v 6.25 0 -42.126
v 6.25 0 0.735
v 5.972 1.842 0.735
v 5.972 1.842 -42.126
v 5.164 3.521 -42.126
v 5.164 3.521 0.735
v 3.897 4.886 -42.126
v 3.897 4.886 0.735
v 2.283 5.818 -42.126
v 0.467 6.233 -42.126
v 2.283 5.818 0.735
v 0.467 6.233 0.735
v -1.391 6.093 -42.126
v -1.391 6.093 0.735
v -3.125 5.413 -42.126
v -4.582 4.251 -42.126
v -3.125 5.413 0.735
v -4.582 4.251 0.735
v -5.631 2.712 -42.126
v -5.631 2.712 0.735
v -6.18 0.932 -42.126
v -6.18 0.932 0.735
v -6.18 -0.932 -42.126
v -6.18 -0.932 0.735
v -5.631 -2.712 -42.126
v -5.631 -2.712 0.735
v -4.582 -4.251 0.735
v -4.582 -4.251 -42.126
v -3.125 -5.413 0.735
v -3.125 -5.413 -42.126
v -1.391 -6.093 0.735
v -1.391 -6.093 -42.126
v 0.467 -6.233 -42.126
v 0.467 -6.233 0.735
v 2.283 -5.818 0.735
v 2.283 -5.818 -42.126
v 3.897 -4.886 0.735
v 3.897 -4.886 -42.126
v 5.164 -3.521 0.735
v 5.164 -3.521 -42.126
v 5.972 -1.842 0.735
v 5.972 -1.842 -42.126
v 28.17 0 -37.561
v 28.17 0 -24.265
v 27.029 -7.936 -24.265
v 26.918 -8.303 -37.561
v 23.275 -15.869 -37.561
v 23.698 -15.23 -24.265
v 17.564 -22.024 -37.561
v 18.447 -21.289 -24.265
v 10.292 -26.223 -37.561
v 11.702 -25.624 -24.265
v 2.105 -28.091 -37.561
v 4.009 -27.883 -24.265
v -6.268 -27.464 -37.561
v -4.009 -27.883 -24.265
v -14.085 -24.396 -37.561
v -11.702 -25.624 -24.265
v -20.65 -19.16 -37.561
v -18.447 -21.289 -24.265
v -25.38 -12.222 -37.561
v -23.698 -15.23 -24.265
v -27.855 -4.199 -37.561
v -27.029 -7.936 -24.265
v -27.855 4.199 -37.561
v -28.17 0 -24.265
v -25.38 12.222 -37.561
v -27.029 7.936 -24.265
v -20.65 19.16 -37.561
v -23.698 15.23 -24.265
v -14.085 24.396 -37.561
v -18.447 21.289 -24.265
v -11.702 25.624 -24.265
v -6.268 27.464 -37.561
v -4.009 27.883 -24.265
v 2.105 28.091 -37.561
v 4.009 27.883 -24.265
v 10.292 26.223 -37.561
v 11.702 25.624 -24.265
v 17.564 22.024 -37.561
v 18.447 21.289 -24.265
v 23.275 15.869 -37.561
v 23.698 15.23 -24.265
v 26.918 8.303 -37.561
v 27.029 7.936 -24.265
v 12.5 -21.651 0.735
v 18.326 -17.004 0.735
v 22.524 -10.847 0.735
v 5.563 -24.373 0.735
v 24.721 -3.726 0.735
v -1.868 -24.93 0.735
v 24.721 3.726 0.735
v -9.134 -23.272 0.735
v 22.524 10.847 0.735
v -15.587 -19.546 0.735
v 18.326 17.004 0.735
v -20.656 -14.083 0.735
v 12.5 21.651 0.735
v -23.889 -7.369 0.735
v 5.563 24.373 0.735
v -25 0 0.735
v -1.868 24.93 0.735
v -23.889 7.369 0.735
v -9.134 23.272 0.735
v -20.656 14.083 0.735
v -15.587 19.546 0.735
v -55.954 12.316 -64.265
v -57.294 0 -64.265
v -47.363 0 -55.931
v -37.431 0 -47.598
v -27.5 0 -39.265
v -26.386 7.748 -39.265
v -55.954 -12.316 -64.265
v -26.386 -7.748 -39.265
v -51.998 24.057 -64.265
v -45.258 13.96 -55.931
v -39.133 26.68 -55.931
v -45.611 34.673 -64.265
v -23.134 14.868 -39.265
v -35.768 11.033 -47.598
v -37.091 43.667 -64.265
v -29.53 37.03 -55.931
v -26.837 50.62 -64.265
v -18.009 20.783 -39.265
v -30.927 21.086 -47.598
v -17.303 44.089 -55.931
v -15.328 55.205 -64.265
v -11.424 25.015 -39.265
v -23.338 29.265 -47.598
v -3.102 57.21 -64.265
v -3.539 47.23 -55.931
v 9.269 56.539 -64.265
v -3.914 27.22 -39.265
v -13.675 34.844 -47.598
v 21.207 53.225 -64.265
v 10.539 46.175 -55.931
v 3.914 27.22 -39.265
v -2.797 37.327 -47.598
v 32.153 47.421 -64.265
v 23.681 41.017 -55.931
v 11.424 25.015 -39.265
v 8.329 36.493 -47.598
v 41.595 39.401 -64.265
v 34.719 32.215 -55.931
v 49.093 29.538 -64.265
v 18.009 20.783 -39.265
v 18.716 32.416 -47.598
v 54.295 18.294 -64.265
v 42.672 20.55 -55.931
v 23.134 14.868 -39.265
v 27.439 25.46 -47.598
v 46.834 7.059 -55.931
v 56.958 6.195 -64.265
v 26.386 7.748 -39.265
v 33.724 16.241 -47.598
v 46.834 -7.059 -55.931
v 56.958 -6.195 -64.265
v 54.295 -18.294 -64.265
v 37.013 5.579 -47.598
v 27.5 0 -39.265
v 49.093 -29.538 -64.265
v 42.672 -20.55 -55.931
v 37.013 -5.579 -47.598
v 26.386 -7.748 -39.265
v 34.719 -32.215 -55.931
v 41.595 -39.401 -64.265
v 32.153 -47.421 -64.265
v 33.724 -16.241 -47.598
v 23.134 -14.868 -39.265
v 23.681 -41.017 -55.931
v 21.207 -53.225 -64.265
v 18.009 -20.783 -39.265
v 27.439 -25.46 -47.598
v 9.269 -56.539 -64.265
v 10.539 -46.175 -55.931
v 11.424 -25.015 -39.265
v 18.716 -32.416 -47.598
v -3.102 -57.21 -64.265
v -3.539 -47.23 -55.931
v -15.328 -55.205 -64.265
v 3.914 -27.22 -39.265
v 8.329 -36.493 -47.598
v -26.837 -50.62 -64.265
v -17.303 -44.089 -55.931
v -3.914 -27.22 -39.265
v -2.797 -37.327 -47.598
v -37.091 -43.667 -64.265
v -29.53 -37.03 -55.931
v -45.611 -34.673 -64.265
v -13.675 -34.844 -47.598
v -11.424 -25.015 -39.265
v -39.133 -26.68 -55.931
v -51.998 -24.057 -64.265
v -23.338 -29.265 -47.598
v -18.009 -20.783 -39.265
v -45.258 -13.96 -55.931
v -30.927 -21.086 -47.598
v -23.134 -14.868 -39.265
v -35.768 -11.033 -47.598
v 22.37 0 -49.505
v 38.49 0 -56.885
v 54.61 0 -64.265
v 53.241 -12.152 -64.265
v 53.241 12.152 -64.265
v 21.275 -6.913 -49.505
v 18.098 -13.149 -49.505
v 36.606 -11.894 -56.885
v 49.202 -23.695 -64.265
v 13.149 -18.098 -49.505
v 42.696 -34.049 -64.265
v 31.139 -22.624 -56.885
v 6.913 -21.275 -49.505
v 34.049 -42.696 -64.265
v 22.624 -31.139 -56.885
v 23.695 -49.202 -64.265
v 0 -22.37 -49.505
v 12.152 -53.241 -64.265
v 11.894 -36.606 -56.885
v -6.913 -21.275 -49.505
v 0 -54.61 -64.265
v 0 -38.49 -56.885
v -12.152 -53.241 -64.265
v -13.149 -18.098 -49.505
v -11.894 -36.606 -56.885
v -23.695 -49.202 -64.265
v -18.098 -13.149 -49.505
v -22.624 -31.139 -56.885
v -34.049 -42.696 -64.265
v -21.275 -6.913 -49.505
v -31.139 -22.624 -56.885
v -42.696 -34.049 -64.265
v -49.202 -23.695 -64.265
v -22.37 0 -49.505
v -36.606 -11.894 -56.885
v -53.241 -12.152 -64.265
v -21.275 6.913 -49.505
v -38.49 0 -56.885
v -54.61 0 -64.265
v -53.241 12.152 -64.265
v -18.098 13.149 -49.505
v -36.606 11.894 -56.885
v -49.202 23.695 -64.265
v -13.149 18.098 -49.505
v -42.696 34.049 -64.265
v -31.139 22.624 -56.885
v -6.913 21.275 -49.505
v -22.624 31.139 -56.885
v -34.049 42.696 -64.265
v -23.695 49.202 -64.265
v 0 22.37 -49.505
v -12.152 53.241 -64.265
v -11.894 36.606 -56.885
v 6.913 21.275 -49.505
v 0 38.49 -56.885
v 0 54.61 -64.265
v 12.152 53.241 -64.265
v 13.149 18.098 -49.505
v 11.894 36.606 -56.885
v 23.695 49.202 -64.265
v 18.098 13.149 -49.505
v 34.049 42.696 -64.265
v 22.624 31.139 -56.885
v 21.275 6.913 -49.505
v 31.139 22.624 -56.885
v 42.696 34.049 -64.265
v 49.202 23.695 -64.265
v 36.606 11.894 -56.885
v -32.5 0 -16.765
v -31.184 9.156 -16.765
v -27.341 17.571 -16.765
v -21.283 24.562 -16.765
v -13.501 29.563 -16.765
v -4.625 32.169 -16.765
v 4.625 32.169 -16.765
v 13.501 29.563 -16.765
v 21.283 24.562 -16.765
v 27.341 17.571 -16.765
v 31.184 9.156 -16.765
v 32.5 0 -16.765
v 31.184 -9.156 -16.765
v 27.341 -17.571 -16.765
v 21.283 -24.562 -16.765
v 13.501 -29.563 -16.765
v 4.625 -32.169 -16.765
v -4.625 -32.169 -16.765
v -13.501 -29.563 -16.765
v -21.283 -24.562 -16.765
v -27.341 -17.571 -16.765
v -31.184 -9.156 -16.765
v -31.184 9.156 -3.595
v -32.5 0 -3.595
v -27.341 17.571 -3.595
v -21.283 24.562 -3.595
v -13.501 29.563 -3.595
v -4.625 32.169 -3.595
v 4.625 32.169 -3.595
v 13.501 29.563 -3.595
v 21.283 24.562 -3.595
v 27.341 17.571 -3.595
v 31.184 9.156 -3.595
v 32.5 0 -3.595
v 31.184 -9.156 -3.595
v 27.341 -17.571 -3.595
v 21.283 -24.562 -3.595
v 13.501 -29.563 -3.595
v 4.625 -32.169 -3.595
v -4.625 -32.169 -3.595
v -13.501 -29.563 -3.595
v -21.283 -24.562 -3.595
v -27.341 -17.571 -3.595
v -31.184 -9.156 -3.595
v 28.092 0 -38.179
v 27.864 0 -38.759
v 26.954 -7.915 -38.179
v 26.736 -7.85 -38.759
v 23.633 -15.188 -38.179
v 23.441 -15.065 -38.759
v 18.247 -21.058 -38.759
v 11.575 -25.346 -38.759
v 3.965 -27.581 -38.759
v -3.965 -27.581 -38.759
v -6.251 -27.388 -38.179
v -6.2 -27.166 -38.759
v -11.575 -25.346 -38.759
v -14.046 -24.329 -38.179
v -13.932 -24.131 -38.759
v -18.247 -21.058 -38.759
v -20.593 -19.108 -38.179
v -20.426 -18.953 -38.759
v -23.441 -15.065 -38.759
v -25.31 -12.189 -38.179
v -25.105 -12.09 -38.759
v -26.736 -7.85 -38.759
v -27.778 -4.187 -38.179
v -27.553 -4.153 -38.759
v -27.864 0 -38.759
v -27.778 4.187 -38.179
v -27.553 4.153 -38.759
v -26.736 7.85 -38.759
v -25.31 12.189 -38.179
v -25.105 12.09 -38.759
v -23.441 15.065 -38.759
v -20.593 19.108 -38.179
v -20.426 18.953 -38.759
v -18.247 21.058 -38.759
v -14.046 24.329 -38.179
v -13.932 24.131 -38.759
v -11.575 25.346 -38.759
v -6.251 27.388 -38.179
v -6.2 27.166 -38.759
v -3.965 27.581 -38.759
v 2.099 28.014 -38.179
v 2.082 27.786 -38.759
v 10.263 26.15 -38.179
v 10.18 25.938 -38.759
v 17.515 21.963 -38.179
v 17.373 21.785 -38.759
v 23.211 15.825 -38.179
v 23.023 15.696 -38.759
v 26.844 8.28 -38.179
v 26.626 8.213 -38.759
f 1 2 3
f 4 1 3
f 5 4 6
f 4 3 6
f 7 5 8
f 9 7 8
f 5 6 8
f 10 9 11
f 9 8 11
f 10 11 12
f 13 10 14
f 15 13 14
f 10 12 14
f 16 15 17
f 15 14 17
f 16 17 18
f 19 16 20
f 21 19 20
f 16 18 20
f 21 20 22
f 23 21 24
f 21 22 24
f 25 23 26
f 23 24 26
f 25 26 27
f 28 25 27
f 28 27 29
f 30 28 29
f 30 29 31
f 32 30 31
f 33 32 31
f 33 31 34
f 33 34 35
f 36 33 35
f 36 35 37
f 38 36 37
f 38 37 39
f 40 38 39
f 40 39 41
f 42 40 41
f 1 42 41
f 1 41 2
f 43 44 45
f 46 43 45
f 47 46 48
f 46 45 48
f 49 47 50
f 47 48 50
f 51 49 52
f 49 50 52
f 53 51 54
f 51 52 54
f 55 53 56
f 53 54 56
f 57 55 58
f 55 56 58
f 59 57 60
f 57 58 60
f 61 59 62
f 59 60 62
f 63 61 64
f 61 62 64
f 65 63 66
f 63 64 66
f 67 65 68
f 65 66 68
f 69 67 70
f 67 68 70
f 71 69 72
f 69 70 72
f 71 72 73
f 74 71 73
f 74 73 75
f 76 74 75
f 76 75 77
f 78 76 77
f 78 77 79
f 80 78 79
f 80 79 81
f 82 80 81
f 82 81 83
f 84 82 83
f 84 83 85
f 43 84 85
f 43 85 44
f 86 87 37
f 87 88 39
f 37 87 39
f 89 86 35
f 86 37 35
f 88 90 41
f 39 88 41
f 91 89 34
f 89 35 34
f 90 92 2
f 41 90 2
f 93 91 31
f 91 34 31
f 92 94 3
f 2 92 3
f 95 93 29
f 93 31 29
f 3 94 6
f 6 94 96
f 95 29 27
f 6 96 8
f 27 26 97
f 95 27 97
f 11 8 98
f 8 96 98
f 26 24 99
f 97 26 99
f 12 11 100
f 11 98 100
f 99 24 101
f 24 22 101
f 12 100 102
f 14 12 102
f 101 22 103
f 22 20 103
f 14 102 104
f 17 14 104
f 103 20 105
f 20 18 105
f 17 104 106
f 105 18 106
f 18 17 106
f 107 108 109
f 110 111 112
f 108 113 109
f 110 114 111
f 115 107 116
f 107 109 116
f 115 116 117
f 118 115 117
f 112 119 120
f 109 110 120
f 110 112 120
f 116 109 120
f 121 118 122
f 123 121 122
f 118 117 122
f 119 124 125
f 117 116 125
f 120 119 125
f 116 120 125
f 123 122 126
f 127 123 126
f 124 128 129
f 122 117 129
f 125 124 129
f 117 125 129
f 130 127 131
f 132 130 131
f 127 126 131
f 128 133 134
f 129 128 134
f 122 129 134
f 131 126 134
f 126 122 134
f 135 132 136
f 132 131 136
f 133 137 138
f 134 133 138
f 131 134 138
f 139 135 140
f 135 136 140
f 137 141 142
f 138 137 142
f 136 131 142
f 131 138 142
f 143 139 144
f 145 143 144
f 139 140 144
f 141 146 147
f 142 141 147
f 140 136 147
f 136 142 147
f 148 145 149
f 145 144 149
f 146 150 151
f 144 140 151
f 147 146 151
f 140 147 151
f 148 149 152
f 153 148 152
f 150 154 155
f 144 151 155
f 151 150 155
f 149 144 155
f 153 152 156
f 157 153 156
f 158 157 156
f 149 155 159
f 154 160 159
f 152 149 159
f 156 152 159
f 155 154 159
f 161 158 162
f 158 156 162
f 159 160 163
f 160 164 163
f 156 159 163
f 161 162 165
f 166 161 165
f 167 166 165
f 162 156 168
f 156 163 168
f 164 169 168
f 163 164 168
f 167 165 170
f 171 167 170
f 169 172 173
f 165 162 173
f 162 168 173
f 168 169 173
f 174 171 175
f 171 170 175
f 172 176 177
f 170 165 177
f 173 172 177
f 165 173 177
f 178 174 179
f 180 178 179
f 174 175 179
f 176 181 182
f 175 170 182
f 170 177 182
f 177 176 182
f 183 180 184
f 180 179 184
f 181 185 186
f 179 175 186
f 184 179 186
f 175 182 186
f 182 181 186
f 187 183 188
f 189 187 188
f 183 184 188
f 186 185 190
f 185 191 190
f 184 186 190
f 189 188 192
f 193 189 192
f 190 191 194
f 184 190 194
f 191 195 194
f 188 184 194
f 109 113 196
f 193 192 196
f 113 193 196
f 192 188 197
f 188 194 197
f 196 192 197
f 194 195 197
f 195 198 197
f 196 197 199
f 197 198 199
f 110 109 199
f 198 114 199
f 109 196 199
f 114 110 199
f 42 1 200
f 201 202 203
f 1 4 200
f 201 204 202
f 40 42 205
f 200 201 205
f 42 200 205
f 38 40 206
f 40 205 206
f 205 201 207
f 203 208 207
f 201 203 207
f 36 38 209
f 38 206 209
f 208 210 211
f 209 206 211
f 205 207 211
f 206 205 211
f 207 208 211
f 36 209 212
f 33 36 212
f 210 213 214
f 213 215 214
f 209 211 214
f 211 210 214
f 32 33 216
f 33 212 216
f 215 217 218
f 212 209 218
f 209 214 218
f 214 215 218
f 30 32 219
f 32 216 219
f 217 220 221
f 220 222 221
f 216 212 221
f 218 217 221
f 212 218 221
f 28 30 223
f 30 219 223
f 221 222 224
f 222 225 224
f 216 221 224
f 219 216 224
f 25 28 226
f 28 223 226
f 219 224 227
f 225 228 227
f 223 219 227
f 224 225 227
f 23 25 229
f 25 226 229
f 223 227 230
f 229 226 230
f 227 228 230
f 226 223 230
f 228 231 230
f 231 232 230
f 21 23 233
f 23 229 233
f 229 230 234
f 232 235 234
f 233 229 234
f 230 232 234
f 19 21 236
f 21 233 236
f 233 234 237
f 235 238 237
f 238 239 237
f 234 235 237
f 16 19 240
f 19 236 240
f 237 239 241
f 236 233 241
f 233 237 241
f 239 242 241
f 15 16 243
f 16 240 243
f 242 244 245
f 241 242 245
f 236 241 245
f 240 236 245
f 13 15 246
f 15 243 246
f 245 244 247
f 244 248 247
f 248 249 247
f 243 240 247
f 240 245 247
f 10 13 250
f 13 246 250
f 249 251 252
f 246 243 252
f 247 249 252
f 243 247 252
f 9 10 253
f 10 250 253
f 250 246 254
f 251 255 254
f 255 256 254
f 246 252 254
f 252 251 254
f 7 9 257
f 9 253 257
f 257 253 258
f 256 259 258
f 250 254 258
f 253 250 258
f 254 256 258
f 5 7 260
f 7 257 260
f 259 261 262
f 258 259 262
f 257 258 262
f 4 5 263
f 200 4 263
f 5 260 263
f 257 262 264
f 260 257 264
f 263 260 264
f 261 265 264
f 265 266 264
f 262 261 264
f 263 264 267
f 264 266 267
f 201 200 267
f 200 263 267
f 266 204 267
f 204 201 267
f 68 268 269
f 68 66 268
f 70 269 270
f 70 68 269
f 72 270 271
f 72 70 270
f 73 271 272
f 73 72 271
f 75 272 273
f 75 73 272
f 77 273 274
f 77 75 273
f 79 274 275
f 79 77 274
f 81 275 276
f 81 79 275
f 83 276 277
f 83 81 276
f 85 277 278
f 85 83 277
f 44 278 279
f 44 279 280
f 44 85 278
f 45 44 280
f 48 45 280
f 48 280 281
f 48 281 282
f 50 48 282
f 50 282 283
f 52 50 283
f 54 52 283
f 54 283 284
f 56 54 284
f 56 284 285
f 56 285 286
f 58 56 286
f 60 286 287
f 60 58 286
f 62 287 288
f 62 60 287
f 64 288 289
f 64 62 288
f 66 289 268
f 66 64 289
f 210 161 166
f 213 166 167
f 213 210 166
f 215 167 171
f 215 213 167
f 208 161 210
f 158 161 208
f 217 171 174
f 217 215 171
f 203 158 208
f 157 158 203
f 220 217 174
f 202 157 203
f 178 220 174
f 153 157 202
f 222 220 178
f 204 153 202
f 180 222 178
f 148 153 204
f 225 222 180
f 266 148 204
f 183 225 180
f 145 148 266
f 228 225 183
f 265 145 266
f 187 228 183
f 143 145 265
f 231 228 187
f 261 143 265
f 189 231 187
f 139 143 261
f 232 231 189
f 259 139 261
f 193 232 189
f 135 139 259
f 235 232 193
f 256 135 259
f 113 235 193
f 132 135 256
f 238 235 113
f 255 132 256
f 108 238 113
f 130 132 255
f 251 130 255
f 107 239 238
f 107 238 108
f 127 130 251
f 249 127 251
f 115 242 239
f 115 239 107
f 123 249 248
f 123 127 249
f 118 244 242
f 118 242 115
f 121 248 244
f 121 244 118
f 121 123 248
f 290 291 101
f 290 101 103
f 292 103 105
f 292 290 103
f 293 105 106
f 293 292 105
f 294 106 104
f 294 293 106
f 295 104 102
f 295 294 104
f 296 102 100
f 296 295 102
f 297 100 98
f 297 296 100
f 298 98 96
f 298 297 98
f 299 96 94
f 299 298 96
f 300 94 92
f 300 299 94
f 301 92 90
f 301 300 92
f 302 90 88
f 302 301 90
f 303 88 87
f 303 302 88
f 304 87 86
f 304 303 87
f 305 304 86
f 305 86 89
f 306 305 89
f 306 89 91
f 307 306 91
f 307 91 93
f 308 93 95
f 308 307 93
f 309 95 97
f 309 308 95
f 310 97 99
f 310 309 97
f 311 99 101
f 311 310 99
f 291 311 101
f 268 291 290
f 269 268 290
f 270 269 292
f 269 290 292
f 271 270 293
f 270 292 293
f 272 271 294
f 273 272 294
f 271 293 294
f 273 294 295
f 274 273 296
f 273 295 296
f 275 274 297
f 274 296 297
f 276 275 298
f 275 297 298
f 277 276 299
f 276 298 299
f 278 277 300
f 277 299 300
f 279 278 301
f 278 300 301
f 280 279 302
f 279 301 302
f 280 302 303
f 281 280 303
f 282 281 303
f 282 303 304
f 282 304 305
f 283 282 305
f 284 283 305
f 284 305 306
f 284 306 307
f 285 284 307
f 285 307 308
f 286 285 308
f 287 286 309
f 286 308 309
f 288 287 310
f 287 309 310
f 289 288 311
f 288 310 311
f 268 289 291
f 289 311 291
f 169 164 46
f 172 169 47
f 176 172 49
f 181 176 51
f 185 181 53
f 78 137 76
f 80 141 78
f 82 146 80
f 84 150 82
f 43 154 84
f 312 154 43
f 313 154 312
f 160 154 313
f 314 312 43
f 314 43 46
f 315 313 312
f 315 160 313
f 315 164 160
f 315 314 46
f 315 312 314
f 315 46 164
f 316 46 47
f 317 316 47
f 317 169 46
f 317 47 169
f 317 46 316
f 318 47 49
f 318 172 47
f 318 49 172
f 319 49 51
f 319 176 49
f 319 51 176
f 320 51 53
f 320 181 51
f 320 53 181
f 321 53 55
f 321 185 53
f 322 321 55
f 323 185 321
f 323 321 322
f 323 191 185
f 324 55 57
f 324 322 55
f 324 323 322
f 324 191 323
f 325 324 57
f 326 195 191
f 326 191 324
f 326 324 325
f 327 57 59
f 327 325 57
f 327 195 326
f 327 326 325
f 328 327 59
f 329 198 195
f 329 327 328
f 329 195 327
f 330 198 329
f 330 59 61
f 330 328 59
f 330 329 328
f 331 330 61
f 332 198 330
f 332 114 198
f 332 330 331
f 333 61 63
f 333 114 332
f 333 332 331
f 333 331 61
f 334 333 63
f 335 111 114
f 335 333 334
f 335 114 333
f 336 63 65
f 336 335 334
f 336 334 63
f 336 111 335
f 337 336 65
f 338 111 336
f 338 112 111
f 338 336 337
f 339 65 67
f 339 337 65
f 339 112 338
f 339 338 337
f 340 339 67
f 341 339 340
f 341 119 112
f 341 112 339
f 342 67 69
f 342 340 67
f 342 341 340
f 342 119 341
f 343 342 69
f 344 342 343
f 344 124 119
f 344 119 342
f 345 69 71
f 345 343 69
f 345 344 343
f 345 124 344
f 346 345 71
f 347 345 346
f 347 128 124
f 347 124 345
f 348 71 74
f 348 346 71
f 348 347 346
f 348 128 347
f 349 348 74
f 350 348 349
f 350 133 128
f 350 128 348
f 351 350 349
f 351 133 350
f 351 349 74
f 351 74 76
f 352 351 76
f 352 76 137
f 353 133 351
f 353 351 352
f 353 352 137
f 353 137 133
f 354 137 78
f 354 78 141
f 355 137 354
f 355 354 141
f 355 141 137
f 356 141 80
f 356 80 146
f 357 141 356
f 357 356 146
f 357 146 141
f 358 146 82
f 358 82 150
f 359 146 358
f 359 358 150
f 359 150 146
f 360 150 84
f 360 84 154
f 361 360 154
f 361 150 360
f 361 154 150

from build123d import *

# Parameters (mm, degrees)
SKETCH56_R           = 6.5
BOSS_EXTRUDE10_DEPTH = 5
CHAMFER1_SIZE        = 1.5
CHAMFER1_SIZE2       = 0.866025404
CHAMFER2_SIZE        = 1.5
CHAMFER2_SIZE2       = 0.866025404
SKETCH59_R           = 5.633974596
BOSS_EXTRUDE12_DEPTH = 3
SKETCH60_R           = 5.5
BOSS_EXTRUDE13_DEPTH = 5
BOSS_EXTRUDE13_DRAFT = -50
SKETCH64_R           = 1.25
CUT_EXTRUDE3_DEPTH   = 53
FILLET3_R            = 0.5
SCALE1_SCALE         = 5


with BuildPart() as part:
    # Sketch56 → Boss-Extrude10 (new body)
    with BuildSketch(Plane(origin=(0, 0, -24.5), x_dir=(-1, 0, 0), z_dir=(0, 0, -1))):
        Circle(SKETCH56_R)
    extrude(amount=BOSS_EXTRUDE10_DEPTH)

    # Chamfer1
    chamfer1_edges = [part.edges().sort_by_distance(p)[0] for p in [
        (6.5, 0, -24.5),
    ]]
    chamfer1_side = [part.faces().sort_by_distance(p)[0] for p in [
        (0, 0, -24.5),
    ]]
    chamfer(chamfer1_edges, length=CHAMFER1_SIZE, length2=CHAMFER1_SIZE2, reference=chamfer1_side[0])

    # Chamfer2
    chamfer2_edges = [part.edges().sort_by_distance(p)[0] for p in [
        (6.5, 0, -29.5),
    ]]
    chamfer2_side = [part.faces().sort_by_distance(p)[0] for p in [
        (6.5, 0, -27.433012702),
    ]]
    chamfer(chamfer2_edges, length=CHAMFER2_SIZE, length2=CHAMFER2_SIZE2, reference=chamfer2_side[0])

    # Sketch59 → Boss-Extrude12 (add)
    with BuildSketch(Plane(origin=(0, 0, -29.5), x_dir=(-1, 0, 0), z_dir=(0, 0, -1))):
        with Locations(Location((0, 0, 0), (0, 0, 180))):
            Circle(SKETCH59_R)
    extrude(amount=BOSS_EXTRUDE12_DEPTH)


with BuildPart() as boss_extrude13_tool:
    # Sketch60 → Boss-Extrude13 (with draft: the straight prism first)
    with BuildSketch(Plane(origin=(0, 0, -32.5), x_dir=(-1, 0, 0), z_dir=(0, 0, -1))):
        Circle(SKETCH60_R)
    extrude(amount=BOSS_EXTRUDE13_DEPTH)
    # Boss-Extrude13: the draft: its side faces are tilted about the plane it starts from
    boss_extrude13_sides = [boss_extrude13_tool.faces().sort_by_distance(p)[0] for p in [
        (5.5, 0, -35),
    ]]
    draft(boss_extrude13_sides, Plane(origin=(0, 0, -32.5), x_dir=(-1, 0, 0), z_dir=(0, 0, -1)), BOSS_EXTRUDE13_DRAFT)


with BuildPart() as part_1:
    add(part.part)

    # Boss-Extrude13: add boss_extrude13_tool
    add(boss_extrude13_tool.part)

    # Sketch62 → Cut-Revolve2 (revolve, cut)
    with BuildSketch(Plane(origin=(0, 0, 0), x_dir=(0, 0, -1), z_dir=(1, 0, 0)), mode=Mode.PRIVATE) as cut_revolve2_sk:
        Polygon((32.5, 0), (37.5, 10.922090923), (37.5, 0), align=None)
    revolve(cut_revolve2_sk.sketch.rotate(Axis((0, 0, -32.5), (0, 0, -1)), 90), axis=Axis((0, 0, -32.5), (0, 0, -1)), mode=Mode.SUBTRACT)

    # Sketch64 → Cut-Extrude3 (cut)
    with BuildSketch(Plane.XY.offset(-24.5)):
        Circle(SKETCH64_R)
    extrude(amount=-CUT_EXTRUDE3_DEPTH, mode=Mode.SUBTRACT)

    # Fillet3
    # the kernel refuses this fillet: 0.5 mm, written as the material it takes off along each edge
    with BuildSketch(Plane(origin=(0, 0, -32.5), x_dir=(1, 0, 0), z_dir=(0, 1, 0))) as fillet3_piece_1:
        with BuildLine():
            CenterArc((5.133974596, -0.340625019), FILLET3_R, 0, 42.941402865)
            Line((5.5, 0), (5.633974596, 0))
            Line((5.633974596, 0), (5.633974596, -0.340625019))
        make_face()
    revolve(axis=Axis((0, 0, -32.5), (0, 0, -1)), mode=Mode.SUBTRACT)


with BuildPart() as part_2:
    # Scale1: scaled about (0, 0, -30.8088706)
    add(part_1.part.scale(SCALE1_SCALE).moved(Location((0, 0, 123.2354824))))


solid = part_2.part
